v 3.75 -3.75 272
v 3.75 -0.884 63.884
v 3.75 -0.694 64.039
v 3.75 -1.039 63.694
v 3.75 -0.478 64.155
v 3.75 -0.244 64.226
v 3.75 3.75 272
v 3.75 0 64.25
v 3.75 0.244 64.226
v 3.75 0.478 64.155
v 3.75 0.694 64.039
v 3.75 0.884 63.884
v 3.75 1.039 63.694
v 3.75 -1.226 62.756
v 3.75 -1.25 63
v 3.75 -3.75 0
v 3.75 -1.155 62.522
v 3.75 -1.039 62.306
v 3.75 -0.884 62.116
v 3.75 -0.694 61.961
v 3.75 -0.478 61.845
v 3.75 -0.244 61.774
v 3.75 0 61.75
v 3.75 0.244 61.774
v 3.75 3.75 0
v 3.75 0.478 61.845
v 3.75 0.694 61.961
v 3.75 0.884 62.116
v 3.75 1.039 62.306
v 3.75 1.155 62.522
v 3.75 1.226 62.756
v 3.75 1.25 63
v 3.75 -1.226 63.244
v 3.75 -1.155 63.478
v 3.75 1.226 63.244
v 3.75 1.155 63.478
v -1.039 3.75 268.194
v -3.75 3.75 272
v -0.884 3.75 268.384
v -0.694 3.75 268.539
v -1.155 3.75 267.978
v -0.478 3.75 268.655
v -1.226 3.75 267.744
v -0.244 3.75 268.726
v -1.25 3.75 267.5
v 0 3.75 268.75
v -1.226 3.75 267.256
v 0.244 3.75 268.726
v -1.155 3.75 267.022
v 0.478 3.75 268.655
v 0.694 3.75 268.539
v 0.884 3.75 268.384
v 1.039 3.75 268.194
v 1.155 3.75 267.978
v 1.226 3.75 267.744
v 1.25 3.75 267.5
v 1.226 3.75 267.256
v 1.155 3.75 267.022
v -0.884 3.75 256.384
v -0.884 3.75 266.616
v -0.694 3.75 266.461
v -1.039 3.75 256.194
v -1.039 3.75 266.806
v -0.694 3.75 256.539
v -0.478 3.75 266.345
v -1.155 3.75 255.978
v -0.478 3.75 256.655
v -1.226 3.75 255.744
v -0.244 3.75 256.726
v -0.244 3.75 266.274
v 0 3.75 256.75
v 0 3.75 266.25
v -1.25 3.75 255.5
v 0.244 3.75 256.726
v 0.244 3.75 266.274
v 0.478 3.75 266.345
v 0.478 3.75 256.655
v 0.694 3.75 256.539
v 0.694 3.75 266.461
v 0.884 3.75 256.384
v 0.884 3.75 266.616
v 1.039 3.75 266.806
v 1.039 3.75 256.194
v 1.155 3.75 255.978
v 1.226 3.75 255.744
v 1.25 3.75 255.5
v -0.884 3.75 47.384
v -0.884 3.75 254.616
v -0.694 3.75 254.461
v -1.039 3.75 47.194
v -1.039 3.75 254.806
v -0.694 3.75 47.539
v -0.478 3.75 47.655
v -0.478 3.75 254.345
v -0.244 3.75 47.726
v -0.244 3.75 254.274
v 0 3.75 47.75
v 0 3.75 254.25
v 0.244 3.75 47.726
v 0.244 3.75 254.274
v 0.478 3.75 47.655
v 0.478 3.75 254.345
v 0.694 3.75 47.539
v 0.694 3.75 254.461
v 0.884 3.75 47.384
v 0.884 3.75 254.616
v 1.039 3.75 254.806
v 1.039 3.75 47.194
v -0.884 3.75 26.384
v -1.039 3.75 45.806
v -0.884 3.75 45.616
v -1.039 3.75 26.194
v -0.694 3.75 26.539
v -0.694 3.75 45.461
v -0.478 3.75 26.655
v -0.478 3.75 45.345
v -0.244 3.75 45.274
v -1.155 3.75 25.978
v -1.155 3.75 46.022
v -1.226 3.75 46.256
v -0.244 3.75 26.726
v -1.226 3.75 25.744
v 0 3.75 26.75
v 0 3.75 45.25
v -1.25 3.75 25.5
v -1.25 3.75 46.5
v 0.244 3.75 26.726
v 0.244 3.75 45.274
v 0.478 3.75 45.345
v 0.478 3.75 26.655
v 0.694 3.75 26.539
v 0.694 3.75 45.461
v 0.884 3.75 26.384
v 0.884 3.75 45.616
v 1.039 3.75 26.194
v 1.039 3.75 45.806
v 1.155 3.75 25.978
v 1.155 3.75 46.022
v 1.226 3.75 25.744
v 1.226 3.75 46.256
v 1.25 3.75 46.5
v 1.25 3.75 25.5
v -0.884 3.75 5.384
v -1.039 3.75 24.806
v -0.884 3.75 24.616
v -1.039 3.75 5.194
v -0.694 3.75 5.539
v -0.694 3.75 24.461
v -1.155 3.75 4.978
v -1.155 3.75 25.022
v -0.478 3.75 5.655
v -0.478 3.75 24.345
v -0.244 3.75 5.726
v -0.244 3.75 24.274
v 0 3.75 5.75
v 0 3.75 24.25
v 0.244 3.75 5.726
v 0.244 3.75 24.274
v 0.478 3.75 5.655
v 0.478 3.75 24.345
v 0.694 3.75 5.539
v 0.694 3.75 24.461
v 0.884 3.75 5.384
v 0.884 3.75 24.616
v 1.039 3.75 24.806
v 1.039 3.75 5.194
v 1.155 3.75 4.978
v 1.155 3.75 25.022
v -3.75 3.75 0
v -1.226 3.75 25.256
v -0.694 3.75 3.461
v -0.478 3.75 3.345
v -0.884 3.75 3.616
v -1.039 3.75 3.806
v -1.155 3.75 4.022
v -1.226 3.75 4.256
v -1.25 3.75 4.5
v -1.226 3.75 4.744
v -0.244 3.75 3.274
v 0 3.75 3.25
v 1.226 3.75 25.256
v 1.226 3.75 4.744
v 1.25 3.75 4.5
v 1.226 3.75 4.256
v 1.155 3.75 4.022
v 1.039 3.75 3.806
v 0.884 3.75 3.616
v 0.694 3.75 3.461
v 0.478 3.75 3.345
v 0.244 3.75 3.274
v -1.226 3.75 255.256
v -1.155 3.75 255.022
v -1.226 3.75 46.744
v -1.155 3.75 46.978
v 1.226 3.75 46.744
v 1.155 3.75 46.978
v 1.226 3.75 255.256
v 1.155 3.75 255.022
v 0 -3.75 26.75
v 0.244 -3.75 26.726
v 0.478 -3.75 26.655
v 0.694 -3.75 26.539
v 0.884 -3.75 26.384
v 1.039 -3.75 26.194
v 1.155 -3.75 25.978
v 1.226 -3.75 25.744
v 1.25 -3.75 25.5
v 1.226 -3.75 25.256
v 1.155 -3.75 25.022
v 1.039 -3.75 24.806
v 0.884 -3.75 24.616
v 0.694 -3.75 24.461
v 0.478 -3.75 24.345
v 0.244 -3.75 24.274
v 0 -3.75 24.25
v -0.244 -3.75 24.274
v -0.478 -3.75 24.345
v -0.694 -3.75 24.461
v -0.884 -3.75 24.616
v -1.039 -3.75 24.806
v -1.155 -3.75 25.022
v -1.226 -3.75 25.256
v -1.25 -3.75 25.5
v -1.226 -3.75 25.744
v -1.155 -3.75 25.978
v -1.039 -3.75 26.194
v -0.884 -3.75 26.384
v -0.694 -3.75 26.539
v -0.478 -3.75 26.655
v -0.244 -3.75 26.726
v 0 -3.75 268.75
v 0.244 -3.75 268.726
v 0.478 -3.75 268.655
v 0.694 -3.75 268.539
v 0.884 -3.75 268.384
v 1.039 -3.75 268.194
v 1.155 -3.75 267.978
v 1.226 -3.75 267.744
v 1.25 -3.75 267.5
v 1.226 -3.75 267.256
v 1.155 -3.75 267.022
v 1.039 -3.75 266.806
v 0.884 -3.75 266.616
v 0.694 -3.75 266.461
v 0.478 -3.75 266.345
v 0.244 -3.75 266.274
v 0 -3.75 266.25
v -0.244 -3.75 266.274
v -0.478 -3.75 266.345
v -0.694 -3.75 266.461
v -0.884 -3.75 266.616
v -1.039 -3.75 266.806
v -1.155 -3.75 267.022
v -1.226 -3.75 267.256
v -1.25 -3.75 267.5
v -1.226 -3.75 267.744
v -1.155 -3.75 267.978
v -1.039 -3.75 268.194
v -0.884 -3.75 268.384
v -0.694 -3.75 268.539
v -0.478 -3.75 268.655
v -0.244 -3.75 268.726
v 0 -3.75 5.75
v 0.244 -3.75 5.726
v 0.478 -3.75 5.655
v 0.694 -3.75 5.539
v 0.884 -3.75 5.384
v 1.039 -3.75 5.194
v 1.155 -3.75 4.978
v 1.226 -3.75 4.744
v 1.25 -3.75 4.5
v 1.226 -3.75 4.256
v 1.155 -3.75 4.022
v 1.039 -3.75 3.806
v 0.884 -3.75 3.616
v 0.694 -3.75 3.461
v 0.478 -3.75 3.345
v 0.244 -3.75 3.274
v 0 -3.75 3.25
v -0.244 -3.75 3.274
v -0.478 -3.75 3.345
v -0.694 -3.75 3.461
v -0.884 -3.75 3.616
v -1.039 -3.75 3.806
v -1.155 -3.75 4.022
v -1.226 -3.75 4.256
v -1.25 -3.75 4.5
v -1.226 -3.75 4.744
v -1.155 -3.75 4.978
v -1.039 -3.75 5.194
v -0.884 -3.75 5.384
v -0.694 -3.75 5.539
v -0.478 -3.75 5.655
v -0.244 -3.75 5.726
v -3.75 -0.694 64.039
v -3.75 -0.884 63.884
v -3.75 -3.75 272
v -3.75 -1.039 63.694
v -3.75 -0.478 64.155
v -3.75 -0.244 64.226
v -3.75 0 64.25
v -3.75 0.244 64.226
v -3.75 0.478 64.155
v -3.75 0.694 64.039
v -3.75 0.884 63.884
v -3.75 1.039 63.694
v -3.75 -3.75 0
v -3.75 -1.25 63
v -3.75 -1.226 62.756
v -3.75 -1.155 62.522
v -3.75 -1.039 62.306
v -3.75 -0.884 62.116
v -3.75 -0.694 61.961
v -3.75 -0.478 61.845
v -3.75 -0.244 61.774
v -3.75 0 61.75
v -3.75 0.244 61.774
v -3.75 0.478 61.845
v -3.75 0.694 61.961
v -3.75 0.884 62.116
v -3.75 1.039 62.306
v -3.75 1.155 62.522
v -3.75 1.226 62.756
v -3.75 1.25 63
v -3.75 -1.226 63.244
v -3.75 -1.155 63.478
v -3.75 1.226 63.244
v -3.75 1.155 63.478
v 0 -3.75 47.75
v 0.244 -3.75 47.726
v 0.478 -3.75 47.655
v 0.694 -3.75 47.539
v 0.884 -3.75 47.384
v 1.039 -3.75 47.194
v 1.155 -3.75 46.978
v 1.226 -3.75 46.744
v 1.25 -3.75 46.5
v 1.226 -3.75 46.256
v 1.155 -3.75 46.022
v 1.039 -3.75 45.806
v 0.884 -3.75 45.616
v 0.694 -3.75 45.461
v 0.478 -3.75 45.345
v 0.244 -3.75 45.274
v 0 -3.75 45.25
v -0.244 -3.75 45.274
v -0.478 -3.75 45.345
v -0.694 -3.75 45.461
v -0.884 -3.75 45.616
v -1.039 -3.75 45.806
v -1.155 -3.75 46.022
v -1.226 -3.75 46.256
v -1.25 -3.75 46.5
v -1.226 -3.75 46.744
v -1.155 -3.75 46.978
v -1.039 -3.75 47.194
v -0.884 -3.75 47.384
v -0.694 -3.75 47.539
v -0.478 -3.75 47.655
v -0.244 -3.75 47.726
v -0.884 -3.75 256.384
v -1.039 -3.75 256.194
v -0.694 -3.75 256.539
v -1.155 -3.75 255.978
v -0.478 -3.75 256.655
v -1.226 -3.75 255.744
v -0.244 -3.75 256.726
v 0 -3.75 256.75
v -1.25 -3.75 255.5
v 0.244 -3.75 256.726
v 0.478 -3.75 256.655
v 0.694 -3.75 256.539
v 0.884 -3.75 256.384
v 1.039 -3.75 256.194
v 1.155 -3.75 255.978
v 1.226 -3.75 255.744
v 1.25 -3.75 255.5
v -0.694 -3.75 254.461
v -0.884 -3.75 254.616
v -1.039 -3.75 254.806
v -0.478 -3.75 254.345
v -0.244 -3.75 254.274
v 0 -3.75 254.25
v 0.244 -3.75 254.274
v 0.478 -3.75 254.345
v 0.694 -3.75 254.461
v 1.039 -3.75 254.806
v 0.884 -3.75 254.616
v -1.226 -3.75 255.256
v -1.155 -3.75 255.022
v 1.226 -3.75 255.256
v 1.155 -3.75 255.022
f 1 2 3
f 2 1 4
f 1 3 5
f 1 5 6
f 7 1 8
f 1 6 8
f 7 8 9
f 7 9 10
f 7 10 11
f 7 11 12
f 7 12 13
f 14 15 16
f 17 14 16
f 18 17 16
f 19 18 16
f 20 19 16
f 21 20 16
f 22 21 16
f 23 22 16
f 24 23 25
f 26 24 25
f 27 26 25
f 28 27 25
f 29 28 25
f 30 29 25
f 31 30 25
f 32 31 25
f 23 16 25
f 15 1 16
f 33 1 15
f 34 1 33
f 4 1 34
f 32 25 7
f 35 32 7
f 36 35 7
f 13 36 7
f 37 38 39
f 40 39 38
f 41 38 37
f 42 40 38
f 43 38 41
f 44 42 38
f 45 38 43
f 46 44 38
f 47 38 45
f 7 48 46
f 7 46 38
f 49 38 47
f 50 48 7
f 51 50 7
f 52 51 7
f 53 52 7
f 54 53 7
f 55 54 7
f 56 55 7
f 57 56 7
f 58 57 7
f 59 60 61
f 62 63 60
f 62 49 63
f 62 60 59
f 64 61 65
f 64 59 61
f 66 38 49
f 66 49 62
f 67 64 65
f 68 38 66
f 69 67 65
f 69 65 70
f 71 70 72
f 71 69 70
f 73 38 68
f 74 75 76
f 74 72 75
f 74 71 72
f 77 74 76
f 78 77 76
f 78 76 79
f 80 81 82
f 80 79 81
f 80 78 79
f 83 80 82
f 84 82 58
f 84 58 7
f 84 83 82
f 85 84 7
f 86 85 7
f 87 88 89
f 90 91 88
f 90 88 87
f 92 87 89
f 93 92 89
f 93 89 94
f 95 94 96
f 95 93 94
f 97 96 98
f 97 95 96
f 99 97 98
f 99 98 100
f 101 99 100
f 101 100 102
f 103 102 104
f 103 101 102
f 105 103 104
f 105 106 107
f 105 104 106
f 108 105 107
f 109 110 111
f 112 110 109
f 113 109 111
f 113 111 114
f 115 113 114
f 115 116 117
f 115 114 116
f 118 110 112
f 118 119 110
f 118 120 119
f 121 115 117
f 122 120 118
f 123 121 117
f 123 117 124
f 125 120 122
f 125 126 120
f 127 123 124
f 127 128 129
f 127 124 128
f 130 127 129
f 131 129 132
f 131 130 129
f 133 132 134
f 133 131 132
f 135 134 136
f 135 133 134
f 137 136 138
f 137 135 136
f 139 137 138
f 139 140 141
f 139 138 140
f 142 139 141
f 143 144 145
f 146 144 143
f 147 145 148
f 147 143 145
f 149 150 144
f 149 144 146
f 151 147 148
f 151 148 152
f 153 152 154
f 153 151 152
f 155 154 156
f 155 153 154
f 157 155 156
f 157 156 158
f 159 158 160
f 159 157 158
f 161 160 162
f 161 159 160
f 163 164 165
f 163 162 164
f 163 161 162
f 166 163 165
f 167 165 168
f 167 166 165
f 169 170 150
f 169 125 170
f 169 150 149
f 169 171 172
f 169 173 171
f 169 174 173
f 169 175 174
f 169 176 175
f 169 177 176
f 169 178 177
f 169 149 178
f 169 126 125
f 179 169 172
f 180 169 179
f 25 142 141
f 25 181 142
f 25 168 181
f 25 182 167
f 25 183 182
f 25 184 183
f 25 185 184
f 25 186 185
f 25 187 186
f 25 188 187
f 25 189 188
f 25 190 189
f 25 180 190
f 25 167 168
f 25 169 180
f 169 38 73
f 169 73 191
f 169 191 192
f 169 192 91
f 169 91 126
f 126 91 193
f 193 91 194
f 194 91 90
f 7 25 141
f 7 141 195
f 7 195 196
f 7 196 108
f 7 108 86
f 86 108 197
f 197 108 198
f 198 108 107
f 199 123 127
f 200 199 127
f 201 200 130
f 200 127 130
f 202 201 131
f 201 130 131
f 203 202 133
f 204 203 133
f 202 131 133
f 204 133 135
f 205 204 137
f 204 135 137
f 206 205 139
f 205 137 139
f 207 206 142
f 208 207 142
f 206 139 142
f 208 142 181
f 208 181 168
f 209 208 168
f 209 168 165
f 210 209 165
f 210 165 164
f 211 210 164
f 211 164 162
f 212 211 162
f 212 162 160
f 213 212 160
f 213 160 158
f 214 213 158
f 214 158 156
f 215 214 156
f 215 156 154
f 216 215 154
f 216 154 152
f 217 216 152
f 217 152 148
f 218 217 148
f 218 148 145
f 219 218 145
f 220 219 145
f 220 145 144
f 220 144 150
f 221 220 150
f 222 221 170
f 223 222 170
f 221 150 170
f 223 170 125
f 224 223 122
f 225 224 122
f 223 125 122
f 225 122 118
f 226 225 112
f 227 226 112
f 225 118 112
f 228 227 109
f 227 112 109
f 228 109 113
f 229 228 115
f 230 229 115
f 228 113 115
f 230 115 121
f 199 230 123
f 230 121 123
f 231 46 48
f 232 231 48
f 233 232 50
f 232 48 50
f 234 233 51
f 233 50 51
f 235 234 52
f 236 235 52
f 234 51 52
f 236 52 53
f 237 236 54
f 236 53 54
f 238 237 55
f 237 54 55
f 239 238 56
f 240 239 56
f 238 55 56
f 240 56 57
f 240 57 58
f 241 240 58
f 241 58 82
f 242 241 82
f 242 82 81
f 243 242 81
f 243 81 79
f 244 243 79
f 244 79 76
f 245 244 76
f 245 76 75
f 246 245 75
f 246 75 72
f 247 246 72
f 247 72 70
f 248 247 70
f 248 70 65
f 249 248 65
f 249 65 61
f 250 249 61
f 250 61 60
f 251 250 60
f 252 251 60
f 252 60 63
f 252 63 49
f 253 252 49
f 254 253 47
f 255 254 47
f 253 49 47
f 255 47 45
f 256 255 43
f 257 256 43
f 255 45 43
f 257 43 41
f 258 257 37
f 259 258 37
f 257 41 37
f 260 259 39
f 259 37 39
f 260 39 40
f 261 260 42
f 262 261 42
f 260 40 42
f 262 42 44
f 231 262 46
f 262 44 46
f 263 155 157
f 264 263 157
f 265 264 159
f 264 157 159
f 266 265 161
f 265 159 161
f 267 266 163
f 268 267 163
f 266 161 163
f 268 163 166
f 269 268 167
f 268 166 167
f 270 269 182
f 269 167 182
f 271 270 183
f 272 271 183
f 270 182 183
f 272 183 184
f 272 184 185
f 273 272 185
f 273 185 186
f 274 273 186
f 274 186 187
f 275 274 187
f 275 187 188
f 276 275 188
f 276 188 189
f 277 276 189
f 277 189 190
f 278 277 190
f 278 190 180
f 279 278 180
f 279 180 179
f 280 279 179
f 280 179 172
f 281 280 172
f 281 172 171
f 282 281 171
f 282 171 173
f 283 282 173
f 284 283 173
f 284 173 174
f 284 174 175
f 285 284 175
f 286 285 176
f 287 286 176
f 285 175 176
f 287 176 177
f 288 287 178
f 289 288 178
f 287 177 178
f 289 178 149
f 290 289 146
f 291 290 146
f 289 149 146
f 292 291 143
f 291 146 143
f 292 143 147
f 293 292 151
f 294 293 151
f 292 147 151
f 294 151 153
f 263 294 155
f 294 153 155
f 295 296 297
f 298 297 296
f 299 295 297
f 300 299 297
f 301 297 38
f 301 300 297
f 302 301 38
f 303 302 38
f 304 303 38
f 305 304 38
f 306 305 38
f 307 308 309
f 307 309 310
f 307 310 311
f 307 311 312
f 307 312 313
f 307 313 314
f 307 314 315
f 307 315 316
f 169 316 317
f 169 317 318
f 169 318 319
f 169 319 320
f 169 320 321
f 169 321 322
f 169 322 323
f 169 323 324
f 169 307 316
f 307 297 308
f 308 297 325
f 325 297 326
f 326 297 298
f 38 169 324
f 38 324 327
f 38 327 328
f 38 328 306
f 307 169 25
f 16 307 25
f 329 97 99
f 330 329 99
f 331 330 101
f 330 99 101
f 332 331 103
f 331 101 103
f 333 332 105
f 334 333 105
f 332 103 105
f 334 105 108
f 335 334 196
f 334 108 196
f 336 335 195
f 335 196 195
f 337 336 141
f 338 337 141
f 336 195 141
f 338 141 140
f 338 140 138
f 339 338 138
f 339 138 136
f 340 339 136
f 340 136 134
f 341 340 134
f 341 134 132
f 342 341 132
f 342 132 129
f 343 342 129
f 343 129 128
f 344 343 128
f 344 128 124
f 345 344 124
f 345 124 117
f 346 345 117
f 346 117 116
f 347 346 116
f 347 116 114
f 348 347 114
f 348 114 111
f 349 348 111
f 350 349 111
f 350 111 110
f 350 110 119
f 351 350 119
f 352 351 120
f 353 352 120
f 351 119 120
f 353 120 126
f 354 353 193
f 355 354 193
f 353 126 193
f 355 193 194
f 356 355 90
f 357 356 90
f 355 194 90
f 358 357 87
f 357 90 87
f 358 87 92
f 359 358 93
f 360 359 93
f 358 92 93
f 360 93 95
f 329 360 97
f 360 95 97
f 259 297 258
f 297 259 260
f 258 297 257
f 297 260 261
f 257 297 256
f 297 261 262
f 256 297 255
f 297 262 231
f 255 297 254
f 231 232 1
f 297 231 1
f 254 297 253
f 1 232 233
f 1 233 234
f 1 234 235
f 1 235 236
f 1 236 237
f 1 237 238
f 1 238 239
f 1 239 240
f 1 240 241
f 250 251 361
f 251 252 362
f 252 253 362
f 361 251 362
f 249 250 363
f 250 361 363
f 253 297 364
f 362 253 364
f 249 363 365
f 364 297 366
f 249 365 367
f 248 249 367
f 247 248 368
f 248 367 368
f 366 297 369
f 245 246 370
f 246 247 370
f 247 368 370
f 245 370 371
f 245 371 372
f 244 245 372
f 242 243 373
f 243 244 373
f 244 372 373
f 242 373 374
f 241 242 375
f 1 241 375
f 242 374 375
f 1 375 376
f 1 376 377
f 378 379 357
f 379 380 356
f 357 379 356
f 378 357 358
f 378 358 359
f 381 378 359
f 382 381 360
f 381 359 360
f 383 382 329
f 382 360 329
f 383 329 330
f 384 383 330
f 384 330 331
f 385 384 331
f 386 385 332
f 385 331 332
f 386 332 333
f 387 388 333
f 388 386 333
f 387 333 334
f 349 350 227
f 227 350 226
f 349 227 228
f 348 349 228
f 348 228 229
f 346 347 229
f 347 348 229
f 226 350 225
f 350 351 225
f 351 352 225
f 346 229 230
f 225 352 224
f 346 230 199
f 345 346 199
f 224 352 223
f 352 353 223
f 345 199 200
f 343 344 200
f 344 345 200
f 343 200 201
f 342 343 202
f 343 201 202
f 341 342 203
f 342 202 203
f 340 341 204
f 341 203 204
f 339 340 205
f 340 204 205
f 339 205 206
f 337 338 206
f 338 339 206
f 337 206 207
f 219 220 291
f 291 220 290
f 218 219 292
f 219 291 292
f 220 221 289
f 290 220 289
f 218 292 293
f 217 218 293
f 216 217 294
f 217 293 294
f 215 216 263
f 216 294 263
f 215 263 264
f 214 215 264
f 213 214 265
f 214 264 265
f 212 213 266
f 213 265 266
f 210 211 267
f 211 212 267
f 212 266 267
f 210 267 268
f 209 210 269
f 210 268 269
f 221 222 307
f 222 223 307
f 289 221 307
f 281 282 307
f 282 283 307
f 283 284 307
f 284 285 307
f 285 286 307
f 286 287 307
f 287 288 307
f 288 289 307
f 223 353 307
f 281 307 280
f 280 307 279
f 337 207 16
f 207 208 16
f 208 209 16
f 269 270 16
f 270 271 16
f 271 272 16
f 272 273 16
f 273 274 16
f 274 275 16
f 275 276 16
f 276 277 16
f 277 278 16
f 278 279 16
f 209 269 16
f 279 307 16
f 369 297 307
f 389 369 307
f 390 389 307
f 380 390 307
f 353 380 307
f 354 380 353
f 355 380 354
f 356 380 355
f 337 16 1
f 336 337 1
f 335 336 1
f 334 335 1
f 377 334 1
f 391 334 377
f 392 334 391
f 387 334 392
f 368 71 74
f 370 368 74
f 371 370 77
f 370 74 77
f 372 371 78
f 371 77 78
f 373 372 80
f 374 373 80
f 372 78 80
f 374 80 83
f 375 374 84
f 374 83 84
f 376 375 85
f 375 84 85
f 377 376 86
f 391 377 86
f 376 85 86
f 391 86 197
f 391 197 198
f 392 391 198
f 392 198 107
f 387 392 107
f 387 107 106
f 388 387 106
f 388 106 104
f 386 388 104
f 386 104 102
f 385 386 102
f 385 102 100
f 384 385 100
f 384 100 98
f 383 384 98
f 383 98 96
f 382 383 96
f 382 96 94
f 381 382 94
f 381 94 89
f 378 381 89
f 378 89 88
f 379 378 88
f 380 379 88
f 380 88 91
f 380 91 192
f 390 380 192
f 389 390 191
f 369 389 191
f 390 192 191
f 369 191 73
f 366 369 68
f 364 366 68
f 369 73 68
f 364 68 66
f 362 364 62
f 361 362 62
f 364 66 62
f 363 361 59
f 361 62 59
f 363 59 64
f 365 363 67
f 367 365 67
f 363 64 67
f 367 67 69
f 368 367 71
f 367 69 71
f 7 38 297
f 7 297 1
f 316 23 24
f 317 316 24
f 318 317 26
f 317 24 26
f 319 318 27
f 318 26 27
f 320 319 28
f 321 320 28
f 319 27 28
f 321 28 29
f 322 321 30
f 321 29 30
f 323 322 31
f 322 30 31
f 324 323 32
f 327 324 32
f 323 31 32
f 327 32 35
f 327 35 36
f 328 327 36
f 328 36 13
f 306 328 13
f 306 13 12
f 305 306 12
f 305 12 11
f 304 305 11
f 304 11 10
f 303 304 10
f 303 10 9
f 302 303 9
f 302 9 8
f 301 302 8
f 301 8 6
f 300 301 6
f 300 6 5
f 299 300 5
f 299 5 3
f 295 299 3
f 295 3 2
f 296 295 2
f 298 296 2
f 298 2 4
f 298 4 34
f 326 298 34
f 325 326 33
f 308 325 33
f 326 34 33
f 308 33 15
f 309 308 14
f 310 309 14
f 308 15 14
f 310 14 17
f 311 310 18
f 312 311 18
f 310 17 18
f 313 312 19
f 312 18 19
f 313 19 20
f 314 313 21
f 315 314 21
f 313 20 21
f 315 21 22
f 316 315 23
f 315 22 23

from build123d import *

# Parameters (mm, degrees)
ESQUISSE1_W             = 7.5
ESQUISSE1_H             = 7.5
BOSS_EXTRU_1_DEPTH      = 272
ESQUISSE2_R             = 1.25
ENL_V_MAT_EXTRU_1_DEPTH = 273.129220225
ESQUISSE3_R             = 1.25
ENL_V_MAT_EXTRU_2_DEPTH = 273.129220225


with BuildPart() as part:
    # Esquisse1 → Boss.-Extru.1 (new body)
    with BuildSketch(Plane.XY):
        Rectangle(ESQUISSE1_W, ESQUISSE1_H)
    extrude(amount=BOSS_EXTRU_1_DEPTH)

    # Esquisse2 → Enlèv. mat.-Extru.1 (cut, through all)
    with BuildSketch(Plane(origin=(0, 3.75, 0), x_dir=(1, 0, 0), z_dir=(0, 1, 0))):
        with Locations(Location((0, -4.5, 0), (0, 0, 270))):
            Circle(ESQUISSE2_R)
        with Locations(Location((0, -25.5, 0), (0, 0, 270))):
            Circle(ESQUISSE2_R)
        with Locations(Location((0, -46.5, 0), (0, 0, 270))):
            Circle(ESQUISSE2_R)
        with Locations(Location((0, -255.5, 0), (0, 0, 270))):
            Circle(ESQUISSE2_R)
        with Locations(Location((0, -267.5, 0), (0, 0, 270))):
            Circle(ESQUISSE2_R)
    extrude(amount=-ENL_V_MAT_EXTRU_1_DEPTH, mode=Mode.SUBTRACT)

    # Esquisse3 → Enlèv. mat.-Extru.2 (cut, through all)
    with BuildSketch(Plane(origin=(3.75, 0, 0), x_dir=(0, 0, -1), z_dir=(1, 0, 0))):
        with Locations((-63, 0)):
            Circle(ESQUISSE3_R)
    extrude(amount=-ENL_V_MAT_EXTRU_2_DEPTH, mode=Mode.SUBTRACT)


solid = part.part
